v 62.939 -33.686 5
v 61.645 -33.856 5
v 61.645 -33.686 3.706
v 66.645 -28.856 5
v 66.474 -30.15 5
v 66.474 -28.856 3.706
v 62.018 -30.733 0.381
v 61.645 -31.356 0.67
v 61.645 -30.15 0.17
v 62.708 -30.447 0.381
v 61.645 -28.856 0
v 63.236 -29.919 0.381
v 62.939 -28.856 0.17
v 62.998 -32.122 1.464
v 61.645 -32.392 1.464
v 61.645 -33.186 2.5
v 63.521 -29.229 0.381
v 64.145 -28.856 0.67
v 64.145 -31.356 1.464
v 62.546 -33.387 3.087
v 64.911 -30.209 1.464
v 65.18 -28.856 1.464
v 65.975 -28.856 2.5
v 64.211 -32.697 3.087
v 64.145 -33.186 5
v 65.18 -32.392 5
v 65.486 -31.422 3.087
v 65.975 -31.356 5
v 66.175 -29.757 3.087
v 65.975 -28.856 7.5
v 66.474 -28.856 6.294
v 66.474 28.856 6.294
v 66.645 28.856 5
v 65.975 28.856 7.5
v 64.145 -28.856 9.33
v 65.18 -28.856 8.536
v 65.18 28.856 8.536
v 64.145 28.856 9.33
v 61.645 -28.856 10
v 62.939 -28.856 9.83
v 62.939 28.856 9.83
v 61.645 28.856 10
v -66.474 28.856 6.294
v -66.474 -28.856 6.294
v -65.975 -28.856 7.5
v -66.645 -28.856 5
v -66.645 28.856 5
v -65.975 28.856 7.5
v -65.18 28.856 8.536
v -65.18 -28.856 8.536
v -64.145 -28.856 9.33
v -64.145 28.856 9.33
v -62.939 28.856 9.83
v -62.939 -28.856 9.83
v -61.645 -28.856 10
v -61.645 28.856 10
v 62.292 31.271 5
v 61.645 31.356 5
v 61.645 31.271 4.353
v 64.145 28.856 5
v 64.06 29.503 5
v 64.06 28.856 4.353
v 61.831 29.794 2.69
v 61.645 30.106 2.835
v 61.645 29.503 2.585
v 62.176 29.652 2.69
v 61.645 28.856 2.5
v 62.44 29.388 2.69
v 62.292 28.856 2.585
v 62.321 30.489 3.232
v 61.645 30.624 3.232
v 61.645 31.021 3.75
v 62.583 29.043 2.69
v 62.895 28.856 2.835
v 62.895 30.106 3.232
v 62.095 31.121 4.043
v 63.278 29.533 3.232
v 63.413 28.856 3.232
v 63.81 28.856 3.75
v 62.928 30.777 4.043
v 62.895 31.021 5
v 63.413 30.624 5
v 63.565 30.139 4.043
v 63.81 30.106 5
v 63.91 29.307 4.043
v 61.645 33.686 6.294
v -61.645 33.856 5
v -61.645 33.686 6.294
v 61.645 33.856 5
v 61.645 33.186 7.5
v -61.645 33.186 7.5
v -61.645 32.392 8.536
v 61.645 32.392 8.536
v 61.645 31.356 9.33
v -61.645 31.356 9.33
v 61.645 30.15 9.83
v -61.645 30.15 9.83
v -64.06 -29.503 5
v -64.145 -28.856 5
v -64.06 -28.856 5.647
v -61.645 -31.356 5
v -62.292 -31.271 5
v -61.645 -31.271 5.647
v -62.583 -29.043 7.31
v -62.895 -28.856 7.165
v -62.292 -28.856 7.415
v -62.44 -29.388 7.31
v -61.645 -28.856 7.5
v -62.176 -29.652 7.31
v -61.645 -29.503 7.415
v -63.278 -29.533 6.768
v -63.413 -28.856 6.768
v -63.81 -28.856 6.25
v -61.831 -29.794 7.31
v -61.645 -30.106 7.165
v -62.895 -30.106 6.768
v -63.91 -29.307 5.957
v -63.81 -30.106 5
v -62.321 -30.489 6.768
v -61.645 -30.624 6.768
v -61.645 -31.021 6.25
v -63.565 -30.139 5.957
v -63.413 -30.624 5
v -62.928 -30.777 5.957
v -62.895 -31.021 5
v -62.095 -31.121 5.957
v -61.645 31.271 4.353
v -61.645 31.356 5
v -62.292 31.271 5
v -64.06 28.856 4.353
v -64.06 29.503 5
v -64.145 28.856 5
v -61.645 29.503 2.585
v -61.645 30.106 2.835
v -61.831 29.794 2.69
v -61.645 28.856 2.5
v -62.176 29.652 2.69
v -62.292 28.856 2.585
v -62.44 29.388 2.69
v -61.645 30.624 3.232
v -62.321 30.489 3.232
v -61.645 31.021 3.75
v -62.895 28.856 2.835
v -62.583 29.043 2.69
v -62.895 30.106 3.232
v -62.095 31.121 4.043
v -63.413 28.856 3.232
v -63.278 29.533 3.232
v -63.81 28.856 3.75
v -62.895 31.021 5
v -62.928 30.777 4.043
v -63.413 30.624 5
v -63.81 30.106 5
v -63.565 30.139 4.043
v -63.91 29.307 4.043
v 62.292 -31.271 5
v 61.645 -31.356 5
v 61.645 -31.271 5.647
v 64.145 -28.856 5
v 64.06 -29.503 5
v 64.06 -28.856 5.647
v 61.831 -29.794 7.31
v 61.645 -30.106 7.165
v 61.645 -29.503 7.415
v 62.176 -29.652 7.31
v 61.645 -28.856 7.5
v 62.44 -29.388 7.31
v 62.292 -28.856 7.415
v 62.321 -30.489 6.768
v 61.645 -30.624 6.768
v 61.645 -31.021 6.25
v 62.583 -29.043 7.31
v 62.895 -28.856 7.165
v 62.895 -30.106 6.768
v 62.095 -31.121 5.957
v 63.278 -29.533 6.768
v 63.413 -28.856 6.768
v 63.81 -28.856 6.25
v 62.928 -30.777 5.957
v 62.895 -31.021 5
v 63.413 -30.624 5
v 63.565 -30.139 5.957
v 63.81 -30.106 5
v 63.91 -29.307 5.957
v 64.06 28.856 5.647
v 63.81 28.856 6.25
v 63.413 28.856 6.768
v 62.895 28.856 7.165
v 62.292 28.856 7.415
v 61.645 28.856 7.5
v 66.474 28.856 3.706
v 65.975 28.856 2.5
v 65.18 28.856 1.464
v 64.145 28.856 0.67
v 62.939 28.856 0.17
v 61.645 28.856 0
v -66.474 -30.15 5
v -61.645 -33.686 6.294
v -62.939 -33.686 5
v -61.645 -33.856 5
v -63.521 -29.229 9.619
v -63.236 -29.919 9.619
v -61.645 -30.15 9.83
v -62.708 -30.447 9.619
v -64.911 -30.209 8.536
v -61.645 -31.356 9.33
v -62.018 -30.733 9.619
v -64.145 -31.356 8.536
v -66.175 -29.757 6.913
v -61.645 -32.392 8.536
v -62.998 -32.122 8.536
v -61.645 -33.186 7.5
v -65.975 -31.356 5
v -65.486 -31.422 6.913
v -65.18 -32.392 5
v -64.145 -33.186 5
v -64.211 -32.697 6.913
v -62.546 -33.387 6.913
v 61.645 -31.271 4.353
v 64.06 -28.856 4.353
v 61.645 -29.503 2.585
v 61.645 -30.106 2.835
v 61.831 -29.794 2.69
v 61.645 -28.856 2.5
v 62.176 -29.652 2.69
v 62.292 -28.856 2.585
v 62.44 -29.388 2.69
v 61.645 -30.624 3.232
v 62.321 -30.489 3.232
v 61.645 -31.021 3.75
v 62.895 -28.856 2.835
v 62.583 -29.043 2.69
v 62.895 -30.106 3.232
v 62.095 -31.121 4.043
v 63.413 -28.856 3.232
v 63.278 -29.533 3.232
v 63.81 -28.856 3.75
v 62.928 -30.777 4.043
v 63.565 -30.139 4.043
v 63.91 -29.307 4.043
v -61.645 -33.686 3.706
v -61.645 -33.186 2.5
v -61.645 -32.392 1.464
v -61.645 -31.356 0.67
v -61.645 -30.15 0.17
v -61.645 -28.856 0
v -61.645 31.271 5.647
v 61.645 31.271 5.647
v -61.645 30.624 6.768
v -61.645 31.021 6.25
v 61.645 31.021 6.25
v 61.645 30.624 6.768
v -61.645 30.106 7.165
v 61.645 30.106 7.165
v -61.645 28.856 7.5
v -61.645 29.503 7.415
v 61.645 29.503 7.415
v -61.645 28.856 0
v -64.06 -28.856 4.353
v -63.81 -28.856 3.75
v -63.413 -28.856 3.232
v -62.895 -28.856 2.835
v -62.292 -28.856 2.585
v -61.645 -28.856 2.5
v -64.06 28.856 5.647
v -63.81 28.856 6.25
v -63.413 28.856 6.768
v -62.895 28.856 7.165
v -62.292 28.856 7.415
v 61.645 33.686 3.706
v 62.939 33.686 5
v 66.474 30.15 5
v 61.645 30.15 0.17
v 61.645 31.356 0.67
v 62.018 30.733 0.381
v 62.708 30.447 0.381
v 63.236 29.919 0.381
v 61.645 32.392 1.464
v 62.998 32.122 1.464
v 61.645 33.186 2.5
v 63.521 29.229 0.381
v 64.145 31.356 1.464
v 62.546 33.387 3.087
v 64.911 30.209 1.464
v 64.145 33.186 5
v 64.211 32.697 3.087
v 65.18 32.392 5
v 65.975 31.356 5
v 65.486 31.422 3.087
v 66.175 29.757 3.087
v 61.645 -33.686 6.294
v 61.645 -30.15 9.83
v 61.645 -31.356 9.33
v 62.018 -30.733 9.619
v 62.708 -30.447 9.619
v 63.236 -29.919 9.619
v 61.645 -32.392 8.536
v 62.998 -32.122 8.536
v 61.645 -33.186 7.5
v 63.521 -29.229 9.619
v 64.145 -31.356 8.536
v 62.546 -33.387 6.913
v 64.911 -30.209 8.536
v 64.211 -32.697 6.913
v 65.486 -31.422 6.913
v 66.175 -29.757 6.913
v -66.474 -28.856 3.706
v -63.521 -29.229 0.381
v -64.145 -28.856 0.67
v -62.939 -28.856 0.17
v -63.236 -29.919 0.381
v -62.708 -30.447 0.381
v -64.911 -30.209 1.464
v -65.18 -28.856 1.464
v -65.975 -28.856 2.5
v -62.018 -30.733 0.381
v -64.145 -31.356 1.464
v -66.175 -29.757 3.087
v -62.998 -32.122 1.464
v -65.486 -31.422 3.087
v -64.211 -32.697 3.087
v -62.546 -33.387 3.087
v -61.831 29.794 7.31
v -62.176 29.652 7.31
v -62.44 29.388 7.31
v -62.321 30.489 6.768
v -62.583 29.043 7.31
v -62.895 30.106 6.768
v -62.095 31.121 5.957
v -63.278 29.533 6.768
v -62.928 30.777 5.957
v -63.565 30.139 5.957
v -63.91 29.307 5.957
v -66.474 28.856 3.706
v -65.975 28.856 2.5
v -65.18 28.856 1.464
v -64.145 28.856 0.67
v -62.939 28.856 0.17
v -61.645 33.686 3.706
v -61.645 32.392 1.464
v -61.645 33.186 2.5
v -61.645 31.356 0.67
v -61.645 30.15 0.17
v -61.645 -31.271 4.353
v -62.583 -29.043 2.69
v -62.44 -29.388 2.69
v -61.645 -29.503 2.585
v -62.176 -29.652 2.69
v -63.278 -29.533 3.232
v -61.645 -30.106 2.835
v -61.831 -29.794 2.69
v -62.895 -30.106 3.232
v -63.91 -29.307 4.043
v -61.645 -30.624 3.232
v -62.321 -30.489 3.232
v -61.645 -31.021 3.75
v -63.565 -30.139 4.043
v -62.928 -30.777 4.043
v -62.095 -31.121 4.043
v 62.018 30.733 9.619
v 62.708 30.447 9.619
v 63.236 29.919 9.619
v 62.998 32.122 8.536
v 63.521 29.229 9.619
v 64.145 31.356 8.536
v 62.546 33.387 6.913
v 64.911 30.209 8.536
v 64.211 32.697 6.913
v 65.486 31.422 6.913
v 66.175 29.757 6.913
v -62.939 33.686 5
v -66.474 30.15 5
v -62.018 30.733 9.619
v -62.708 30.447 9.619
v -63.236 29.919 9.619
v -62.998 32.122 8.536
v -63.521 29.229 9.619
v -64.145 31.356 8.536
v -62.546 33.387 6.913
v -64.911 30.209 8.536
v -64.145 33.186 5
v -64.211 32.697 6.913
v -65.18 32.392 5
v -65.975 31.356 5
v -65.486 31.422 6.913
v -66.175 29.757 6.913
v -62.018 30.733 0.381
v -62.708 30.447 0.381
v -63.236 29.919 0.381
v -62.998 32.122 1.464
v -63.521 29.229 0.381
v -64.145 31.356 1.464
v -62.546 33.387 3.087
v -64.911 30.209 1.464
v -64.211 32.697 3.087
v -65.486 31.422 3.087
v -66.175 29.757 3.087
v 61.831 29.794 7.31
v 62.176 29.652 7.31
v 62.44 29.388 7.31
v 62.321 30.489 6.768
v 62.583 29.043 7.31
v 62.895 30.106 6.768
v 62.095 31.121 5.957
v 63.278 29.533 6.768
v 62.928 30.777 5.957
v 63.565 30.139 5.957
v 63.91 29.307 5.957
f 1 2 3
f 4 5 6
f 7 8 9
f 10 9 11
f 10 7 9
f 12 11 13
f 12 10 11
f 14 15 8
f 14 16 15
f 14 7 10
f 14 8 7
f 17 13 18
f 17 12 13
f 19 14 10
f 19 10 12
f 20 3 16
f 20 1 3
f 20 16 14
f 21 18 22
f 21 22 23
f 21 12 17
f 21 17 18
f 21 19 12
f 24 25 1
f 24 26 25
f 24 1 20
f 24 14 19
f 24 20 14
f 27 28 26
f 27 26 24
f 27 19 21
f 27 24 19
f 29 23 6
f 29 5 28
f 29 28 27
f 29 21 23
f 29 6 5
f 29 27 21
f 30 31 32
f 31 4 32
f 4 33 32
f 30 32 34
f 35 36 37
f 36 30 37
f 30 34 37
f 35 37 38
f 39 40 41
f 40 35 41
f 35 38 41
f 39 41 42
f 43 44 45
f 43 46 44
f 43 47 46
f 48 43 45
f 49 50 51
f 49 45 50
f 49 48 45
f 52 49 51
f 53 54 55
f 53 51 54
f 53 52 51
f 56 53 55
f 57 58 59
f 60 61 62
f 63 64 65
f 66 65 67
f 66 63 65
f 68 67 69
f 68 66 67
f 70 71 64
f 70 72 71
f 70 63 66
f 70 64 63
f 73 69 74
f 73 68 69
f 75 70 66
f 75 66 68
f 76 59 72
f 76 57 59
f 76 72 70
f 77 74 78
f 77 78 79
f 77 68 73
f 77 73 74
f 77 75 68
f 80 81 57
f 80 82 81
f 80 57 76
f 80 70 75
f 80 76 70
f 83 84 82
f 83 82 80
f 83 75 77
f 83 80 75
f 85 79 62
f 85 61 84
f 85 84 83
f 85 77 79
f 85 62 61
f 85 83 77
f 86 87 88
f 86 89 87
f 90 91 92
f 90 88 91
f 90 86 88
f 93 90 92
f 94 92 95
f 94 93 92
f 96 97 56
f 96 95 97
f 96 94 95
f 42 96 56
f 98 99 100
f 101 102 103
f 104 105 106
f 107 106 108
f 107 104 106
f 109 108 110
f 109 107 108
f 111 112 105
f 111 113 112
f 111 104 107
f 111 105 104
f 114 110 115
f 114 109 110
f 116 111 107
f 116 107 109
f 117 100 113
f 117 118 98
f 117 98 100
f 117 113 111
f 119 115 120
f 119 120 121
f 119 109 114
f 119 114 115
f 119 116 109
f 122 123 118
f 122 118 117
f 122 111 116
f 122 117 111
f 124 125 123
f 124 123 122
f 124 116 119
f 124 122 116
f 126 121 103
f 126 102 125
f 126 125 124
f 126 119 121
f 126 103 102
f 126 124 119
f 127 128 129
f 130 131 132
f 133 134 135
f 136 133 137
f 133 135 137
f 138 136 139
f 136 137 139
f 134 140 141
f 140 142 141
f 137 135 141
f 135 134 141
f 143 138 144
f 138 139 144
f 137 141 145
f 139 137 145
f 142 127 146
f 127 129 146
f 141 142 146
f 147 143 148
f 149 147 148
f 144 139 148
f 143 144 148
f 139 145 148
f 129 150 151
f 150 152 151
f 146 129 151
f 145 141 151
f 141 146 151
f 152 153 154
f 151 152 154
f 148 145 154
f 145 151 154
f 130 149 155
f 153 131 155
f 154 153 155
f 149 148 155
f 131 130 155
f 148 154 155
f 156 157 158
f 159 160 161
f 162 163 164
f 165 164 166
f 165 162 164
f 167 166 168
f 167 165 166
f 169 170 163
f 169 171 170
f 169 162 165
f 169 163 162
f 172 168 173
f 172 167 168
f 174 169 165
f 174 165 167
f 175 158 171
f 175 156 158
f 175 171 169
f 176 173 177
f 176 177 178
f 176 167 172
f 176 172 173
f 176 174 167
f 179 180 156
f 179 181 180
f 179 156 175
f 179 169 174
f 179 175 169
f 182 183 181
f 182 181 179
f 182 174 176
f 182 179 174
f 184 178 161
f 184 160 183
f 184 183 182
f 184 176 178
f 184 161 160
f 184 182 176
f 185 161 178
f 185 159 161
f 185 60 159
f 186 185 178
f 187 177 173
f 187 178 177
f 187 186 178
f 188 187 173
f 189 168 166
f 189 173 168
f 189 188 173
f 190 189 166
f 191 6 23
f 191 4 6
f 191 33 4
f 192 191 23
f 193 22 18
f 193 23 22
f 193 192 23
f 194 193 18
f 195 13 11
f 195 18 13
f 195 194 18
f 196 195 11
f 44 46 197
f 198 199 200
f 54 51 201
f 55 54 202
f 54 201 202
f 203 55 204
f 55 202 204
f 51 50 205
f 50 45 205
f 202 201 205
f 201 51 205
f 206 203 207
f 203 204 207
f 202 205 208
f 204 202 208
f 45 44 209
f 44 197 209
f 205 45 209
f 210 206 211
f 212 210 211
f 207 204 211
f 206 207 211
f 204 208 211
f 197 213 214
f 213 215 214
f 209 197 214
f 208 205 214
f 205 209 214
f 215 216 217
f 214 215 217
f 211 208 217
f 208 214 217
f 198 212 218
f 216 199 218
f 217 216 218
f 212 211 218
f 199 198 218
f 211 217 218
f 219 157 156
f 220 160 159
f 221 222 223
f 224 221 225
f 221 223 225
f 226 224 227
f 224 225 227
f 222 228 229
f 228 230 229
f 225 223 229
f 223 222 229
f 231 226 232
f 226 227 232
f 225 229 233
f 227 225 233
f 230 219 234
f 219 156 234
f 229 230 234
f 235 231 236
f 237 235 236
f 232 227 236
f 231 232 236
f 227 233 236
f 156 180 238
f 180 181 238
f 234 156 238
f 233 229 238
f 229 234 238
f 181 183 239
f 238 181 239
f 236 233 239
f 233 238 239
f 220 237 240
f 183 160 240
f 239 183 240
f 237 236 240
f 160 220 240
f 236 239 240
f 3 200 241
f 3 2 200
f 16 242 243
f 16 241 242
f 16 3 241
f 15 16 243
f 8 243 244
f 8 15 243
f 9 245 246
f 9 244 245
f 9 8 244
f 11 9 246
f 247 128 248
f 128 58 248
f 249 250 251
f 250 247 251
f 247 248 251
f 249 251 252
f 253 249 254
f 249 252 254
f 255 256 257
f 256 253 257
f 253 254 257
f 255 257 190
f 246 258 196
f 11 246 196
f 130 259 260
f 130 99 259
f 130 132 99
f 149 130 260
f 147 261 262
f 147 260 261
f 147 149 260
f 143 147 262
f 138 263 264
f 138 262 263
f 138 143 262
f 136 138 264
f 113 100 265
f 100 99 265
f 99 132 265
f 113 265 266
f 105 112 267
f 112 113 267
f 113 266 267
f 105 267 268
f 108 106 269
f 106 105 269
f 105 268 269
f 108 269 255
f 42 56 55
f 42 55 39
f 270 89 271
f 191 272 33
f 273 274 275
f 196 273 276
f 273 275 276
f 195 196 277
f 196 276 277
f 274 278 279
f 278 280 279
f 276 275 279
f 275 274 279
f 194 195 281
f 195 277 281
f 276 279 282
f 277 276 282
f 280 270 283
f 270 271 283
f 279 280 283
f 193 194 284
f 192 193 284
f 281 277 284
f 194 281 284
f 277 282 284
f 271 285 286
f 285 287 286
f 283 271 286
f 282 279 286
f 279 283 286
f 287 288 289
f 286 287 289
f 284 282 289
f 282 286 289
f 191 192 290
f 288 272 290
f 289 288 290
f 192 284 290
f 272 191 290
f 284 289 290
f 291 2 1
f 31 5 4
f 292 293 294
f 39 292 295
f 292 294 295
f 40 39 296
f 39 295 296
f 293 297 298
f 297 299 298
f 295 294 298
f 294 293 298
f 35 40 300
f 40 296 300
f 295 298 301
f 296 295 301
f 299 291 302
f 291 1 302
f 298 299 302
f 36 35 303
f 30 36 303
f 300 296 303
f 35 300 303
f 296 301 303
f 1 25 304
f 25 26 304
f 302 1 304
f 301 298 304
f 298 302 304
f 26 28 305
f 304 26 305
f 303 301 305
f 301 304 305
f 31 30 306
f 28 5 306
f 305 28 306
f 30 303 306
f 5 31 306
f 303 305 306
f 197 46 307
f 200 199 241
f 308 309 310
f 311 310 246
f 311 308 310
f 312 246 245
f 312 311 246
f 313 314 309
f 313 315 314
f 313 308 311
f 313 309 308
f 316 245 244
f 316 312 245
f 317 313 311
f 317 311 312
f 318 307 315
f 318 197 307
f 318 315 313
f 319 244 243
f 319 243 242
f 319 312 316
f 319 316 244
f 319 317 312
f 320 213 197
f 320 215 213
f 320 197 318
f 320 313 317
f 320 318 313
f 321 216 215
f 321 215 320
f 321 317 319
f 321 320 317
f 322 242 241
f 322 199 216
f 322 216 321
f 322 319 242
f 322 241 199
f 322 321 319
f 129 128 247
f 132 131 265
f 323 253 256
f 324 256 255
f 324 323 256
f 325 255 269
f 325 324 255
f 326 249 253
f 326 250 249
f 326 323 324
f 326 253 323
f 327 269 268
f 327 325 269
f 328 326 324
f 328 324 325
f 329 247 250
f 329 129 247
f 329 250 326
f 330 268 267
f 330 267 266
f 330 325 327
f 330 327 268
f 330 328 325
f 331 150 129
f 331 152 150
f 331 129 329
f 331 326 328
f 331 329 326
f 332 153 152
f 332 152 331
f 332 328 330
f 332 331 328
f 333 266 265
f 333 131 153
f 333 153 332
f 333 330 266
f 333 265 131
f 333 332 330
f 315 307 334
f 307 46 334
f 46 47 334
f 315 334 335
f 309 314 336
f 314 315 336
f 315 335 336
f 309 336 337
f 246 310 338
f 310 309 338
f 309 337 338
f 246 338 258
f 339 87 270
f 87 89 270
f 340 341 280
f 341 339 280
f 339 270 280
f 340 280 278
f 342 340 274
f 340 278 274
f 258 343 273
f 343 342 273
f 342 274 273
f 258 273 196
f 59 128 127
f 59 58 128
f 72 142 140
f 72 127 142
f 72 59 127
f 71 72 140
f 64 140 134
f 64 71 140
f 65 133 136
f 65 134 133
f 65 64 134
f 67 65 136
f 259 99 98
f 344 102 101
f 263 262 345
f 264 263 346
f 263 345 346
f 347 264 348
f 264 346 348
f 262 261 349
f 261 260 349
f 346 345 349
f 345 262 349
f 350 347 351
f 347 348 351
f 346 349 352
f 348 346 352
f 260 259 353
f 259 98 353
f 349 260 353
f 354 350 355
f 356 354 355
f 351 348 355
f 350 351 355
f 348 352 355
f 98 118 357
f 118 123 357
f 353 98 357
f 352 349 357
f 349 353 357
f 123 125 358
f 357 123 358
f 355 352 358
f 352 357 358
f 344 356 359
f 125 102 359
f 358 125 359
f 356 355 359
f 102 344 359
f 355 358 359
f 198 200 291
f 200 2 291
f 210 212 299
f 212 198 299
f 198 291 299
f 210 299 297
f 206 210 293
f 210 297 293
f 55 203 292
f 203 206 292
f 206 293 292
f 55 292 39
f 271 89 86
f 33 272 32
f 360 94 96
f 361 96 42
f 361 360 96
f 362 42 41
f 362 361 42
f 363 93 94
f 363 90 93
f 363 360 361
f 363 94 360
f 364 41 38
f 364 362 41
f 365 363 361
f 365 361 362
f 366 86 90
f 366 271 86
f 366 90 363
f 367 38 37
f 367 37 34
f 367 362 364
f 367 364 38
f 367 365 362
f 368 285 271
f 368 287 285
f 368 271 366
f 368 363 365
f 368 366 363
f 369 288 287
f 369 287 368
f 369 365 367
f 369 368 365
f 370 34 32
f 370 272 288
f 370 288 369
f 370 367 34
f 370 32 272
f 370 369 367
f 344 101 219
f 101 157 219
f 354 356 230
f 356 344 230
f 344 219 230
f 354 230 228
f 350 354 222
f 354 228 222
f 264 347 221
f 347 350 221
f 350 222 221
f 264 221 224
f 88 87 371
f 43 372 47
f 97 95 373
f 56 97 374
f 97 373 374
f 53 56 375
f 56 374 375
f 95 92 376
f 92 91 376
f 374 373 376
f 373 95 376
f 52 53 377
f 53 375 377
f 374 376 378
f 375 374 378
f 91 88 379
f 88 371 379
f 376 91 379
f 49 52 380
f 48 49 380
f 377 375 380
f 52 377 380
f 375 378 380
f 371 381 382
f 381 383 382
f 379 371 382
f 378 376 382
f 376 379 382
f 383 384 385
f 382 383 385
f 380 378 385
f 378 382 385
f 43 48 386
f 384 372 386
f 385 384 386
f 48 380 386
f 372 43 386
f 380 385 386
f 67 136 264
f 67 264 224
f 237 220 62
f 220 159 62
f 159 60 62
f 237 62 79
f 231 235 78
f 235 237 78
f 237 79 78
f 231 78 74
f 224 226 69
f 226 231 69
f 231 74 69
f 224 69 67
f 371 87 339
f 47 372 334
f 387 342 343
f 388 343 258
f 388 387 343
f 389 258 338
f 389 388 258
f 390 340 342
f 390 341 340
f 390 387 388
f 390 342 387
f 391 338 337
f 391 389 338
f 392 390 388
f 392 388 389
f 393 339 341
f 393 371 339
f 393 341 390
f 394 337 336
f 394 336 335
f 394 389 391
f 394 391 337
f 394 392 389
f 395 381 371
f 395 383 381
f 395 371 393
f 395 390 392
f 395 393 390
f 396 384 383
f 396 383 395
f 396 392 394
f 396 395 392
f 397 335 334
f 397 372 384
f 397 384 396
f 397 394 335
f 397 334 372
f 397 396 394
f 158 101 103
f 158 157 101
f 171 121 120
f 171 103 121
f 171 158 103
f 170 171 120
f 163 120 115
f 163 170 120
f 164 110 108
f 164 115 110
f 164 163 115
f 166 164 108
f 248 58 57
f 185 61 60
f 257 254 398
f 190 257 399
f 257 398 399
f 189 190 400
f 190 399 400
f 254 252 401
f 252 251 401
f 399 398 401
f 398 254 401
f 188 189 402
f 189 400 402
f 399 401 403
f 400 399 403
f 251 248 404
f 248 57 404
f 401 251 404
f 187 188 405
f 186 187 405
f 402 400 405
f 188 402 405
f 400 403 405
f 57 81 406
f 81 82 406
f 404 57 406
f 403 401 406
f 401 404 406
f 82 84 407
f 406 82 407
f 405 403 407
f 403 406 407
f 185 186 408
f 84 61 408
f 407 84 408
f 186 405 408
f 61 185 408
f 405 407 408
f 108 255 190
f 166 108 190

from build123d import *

# Parameters (mm, degrees)
F0_W     = 133.2894712687
F0_H     = 67.712135613
F1_DEPTH = 10
F2_R     = 4.99999
F3_T     = -2.5


# Not quite as in the source:
# - a fillet or chamfer is up to 0.001 mm smaller than in the source, because OpenCascade refuses the exact size


with BuildPart() as f1:
    # F0 (on Top) → F1 (new body)
    with BuildSketch(Plane.XY):
        Rectangle(F0_W, F0_H)
    extrude(amount=F1_DEPTH)

    # F2 (radius 5 in the source; OpenCascade refuses exactly that, so slightly less here)
    f2_edges = [f1.edges().sort_by_distance(p)[0] for p in [
        (66.644736, 33.856068, 5),
        (-66.644736, 33.856068, 5),
        (0, 33.856068, 0),
        (0, 33.856068, 10),
        (-66.644736, -33.856068, 5),
        (-66.644736, 0, 0),
        (-66.644736, 0, 10),
        (66.644736, -33.856068, 5),
        (0, -33.856068, 0),
        (0, -33.856068, 10),
        (66.644736, 0, 0),
        (66.644736, 0, 10),
    ]]
    fillet(f2_edges, radius=F2_R)

    # F3 (hollow: no face is removed)
    offset(amount=F3_T, mode=Mode.SUBTRACT)


solid = f1.part
